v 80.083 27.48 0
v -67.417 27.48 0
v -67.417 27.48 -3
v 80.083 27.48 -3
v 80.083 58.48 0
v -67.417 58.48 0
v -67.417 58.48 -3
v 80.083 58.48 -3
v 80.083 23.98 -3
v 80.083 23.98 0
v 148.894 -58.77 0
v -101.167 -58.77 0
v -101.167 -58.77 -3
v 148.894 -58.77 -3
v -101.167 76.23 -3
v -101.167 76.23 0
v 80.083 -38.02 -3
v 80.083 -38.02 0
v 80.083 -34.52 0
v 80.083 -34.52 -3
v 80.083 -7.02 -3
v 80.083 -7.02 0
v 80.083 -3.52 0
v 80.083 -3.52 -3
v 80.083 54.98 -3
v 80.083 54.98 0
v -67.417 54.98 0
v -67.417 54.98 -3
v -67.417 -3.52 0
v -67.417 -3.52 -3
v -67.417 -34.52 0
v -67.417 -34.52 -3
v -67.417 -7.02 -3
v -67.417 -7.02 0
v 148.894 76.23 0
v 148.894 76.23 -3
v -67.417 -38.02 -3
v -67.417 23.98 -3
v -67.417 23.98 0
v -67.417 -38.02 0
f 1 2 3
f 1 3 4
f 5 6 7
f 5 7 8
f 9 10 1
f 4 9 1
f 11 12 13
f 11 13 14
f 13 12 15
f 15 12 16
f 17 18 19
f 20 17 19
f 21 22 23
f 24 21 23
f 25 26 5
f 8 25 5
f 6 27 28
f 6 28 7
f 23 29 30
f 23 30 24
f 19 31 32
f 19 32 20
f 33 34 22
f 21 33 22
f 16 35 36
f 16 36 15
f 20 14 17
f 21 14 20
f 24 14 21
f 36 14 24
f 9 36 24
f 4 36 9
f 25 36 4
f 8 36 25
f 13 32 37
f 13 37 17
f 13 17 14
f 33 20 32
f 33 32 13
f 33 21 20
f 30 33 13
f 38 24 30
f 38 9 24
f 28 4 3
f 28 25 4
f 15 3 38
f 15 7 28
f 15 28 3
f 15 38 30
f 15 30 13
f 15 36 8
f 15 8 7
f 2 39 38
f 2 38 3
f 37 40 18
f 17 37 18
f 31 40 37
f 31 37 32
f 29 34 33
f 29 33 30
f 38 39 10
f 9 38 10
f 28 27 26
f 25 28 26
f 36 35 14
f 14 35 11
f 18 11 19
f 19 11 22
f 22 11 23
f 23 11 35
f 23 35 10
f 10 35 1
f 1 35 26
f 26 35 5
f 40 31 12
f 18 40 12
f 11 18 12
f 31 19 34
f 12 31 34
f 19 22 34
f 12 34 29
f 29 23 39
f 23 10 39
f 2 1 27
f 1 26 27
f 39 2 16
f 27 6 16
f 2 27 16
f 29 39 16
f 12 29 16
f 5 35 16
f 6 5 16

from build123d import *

# Parameters (mm, degrees)
BOSS_EXTRUDE1_DEPTH = 3
SKETCH3_W           = 147.5
SKETCH3_H           = 3.5
SKETCH3_W_2         = 147
SKETCH3_H_2         = 3
CUT_EXTRUDE2_DEPTH  = 3


with BuildPart() as part:
    # Sketch1 → Boss-Extrude1 (new body)
    with BuildSketch(Plane.XY):
        Polygon((79.894045329, 76.229765013), (148.894045329, 76.229765013), (148.894045329, -58.770234987), (79.894045329, -58.770234987), (-67.167101828, -58.770234987), (-72.167101828, -58.770234987), (-98.167101828, -58.770234987), (-101.167101828, -58.770234987), (-101.167101828, 76.229765013), (-98.167101828, 76.229765013), (-72.167101828, 76.229765013), (-67.167101828, 76.229765013), align=None)
    extrude(amount=-BOSS_EXTRUDE1_DEPTH)

    # Sketch3 → Cut-Extrude2 (cut)
    # profile 1 of 4: a face of its own
    with BuildSketch(Plane.XY):
        with Locations((6.332898172, 56.729765013)):
            Rectangle(SKETCH3_W, SKETCH3_H)
        with Locations((6.332898172, 56.729765013)):
            Rectangle(SKETCH3_W_2, SKETCH3_H_2, mode=Mode.SUBTRACT)
    # profile 2 of 4: a face of its own
    with BuildSketch(Plane.XY):
        with Locations((6.332898172, 25.729765013)):
            Rectangle(SKETCH3_W, SKETCH3_H)
        with Locations((6.332898172, 25.729765013)):
            Rectangle(SKETCH3_W_2, SKETCH3_H_2, mode=Mode.SUBTRACT)
    # profile 3 of 4: a face of its own
    with BuildSketch(Plane.XY):
        with Locations((6.332898172, -5.270234987)):
            Rectangle(SKETCH3_W, SKETCH3_H)
        with Locations((6.332898172, -5.270234987)):
            Rectangle(SKETCH3_W_2, SKETCH3_H_2, mode=Mode.SUBTRACT)
    # profile 4 of 4: a face of its own
    with BuildSketch(Plane.XY):
        with Locations((6.332898172, -36.270234987)):
            Rectangle(SKETCH3_W, SKETCH3_H)
        with Locations((6.332898172, -36.270234987)):
            Rectangle(SKETCH3_W_2, SKETCH3_H_2, mode=Mode.SUBTRACT)
    extrude(amount=-CUT_EXTRUDE2_DEPTH, mode=Mode.SUBTRACT)


with BuildPart() as body_2:
    # of the pieces the cut leaves, the one that is kept (cut_extrude2_keep)
    add(part.part.solids().sort_by_distance((148.894045329, 76.229765013, 0))[0])


solid = body_2.part
